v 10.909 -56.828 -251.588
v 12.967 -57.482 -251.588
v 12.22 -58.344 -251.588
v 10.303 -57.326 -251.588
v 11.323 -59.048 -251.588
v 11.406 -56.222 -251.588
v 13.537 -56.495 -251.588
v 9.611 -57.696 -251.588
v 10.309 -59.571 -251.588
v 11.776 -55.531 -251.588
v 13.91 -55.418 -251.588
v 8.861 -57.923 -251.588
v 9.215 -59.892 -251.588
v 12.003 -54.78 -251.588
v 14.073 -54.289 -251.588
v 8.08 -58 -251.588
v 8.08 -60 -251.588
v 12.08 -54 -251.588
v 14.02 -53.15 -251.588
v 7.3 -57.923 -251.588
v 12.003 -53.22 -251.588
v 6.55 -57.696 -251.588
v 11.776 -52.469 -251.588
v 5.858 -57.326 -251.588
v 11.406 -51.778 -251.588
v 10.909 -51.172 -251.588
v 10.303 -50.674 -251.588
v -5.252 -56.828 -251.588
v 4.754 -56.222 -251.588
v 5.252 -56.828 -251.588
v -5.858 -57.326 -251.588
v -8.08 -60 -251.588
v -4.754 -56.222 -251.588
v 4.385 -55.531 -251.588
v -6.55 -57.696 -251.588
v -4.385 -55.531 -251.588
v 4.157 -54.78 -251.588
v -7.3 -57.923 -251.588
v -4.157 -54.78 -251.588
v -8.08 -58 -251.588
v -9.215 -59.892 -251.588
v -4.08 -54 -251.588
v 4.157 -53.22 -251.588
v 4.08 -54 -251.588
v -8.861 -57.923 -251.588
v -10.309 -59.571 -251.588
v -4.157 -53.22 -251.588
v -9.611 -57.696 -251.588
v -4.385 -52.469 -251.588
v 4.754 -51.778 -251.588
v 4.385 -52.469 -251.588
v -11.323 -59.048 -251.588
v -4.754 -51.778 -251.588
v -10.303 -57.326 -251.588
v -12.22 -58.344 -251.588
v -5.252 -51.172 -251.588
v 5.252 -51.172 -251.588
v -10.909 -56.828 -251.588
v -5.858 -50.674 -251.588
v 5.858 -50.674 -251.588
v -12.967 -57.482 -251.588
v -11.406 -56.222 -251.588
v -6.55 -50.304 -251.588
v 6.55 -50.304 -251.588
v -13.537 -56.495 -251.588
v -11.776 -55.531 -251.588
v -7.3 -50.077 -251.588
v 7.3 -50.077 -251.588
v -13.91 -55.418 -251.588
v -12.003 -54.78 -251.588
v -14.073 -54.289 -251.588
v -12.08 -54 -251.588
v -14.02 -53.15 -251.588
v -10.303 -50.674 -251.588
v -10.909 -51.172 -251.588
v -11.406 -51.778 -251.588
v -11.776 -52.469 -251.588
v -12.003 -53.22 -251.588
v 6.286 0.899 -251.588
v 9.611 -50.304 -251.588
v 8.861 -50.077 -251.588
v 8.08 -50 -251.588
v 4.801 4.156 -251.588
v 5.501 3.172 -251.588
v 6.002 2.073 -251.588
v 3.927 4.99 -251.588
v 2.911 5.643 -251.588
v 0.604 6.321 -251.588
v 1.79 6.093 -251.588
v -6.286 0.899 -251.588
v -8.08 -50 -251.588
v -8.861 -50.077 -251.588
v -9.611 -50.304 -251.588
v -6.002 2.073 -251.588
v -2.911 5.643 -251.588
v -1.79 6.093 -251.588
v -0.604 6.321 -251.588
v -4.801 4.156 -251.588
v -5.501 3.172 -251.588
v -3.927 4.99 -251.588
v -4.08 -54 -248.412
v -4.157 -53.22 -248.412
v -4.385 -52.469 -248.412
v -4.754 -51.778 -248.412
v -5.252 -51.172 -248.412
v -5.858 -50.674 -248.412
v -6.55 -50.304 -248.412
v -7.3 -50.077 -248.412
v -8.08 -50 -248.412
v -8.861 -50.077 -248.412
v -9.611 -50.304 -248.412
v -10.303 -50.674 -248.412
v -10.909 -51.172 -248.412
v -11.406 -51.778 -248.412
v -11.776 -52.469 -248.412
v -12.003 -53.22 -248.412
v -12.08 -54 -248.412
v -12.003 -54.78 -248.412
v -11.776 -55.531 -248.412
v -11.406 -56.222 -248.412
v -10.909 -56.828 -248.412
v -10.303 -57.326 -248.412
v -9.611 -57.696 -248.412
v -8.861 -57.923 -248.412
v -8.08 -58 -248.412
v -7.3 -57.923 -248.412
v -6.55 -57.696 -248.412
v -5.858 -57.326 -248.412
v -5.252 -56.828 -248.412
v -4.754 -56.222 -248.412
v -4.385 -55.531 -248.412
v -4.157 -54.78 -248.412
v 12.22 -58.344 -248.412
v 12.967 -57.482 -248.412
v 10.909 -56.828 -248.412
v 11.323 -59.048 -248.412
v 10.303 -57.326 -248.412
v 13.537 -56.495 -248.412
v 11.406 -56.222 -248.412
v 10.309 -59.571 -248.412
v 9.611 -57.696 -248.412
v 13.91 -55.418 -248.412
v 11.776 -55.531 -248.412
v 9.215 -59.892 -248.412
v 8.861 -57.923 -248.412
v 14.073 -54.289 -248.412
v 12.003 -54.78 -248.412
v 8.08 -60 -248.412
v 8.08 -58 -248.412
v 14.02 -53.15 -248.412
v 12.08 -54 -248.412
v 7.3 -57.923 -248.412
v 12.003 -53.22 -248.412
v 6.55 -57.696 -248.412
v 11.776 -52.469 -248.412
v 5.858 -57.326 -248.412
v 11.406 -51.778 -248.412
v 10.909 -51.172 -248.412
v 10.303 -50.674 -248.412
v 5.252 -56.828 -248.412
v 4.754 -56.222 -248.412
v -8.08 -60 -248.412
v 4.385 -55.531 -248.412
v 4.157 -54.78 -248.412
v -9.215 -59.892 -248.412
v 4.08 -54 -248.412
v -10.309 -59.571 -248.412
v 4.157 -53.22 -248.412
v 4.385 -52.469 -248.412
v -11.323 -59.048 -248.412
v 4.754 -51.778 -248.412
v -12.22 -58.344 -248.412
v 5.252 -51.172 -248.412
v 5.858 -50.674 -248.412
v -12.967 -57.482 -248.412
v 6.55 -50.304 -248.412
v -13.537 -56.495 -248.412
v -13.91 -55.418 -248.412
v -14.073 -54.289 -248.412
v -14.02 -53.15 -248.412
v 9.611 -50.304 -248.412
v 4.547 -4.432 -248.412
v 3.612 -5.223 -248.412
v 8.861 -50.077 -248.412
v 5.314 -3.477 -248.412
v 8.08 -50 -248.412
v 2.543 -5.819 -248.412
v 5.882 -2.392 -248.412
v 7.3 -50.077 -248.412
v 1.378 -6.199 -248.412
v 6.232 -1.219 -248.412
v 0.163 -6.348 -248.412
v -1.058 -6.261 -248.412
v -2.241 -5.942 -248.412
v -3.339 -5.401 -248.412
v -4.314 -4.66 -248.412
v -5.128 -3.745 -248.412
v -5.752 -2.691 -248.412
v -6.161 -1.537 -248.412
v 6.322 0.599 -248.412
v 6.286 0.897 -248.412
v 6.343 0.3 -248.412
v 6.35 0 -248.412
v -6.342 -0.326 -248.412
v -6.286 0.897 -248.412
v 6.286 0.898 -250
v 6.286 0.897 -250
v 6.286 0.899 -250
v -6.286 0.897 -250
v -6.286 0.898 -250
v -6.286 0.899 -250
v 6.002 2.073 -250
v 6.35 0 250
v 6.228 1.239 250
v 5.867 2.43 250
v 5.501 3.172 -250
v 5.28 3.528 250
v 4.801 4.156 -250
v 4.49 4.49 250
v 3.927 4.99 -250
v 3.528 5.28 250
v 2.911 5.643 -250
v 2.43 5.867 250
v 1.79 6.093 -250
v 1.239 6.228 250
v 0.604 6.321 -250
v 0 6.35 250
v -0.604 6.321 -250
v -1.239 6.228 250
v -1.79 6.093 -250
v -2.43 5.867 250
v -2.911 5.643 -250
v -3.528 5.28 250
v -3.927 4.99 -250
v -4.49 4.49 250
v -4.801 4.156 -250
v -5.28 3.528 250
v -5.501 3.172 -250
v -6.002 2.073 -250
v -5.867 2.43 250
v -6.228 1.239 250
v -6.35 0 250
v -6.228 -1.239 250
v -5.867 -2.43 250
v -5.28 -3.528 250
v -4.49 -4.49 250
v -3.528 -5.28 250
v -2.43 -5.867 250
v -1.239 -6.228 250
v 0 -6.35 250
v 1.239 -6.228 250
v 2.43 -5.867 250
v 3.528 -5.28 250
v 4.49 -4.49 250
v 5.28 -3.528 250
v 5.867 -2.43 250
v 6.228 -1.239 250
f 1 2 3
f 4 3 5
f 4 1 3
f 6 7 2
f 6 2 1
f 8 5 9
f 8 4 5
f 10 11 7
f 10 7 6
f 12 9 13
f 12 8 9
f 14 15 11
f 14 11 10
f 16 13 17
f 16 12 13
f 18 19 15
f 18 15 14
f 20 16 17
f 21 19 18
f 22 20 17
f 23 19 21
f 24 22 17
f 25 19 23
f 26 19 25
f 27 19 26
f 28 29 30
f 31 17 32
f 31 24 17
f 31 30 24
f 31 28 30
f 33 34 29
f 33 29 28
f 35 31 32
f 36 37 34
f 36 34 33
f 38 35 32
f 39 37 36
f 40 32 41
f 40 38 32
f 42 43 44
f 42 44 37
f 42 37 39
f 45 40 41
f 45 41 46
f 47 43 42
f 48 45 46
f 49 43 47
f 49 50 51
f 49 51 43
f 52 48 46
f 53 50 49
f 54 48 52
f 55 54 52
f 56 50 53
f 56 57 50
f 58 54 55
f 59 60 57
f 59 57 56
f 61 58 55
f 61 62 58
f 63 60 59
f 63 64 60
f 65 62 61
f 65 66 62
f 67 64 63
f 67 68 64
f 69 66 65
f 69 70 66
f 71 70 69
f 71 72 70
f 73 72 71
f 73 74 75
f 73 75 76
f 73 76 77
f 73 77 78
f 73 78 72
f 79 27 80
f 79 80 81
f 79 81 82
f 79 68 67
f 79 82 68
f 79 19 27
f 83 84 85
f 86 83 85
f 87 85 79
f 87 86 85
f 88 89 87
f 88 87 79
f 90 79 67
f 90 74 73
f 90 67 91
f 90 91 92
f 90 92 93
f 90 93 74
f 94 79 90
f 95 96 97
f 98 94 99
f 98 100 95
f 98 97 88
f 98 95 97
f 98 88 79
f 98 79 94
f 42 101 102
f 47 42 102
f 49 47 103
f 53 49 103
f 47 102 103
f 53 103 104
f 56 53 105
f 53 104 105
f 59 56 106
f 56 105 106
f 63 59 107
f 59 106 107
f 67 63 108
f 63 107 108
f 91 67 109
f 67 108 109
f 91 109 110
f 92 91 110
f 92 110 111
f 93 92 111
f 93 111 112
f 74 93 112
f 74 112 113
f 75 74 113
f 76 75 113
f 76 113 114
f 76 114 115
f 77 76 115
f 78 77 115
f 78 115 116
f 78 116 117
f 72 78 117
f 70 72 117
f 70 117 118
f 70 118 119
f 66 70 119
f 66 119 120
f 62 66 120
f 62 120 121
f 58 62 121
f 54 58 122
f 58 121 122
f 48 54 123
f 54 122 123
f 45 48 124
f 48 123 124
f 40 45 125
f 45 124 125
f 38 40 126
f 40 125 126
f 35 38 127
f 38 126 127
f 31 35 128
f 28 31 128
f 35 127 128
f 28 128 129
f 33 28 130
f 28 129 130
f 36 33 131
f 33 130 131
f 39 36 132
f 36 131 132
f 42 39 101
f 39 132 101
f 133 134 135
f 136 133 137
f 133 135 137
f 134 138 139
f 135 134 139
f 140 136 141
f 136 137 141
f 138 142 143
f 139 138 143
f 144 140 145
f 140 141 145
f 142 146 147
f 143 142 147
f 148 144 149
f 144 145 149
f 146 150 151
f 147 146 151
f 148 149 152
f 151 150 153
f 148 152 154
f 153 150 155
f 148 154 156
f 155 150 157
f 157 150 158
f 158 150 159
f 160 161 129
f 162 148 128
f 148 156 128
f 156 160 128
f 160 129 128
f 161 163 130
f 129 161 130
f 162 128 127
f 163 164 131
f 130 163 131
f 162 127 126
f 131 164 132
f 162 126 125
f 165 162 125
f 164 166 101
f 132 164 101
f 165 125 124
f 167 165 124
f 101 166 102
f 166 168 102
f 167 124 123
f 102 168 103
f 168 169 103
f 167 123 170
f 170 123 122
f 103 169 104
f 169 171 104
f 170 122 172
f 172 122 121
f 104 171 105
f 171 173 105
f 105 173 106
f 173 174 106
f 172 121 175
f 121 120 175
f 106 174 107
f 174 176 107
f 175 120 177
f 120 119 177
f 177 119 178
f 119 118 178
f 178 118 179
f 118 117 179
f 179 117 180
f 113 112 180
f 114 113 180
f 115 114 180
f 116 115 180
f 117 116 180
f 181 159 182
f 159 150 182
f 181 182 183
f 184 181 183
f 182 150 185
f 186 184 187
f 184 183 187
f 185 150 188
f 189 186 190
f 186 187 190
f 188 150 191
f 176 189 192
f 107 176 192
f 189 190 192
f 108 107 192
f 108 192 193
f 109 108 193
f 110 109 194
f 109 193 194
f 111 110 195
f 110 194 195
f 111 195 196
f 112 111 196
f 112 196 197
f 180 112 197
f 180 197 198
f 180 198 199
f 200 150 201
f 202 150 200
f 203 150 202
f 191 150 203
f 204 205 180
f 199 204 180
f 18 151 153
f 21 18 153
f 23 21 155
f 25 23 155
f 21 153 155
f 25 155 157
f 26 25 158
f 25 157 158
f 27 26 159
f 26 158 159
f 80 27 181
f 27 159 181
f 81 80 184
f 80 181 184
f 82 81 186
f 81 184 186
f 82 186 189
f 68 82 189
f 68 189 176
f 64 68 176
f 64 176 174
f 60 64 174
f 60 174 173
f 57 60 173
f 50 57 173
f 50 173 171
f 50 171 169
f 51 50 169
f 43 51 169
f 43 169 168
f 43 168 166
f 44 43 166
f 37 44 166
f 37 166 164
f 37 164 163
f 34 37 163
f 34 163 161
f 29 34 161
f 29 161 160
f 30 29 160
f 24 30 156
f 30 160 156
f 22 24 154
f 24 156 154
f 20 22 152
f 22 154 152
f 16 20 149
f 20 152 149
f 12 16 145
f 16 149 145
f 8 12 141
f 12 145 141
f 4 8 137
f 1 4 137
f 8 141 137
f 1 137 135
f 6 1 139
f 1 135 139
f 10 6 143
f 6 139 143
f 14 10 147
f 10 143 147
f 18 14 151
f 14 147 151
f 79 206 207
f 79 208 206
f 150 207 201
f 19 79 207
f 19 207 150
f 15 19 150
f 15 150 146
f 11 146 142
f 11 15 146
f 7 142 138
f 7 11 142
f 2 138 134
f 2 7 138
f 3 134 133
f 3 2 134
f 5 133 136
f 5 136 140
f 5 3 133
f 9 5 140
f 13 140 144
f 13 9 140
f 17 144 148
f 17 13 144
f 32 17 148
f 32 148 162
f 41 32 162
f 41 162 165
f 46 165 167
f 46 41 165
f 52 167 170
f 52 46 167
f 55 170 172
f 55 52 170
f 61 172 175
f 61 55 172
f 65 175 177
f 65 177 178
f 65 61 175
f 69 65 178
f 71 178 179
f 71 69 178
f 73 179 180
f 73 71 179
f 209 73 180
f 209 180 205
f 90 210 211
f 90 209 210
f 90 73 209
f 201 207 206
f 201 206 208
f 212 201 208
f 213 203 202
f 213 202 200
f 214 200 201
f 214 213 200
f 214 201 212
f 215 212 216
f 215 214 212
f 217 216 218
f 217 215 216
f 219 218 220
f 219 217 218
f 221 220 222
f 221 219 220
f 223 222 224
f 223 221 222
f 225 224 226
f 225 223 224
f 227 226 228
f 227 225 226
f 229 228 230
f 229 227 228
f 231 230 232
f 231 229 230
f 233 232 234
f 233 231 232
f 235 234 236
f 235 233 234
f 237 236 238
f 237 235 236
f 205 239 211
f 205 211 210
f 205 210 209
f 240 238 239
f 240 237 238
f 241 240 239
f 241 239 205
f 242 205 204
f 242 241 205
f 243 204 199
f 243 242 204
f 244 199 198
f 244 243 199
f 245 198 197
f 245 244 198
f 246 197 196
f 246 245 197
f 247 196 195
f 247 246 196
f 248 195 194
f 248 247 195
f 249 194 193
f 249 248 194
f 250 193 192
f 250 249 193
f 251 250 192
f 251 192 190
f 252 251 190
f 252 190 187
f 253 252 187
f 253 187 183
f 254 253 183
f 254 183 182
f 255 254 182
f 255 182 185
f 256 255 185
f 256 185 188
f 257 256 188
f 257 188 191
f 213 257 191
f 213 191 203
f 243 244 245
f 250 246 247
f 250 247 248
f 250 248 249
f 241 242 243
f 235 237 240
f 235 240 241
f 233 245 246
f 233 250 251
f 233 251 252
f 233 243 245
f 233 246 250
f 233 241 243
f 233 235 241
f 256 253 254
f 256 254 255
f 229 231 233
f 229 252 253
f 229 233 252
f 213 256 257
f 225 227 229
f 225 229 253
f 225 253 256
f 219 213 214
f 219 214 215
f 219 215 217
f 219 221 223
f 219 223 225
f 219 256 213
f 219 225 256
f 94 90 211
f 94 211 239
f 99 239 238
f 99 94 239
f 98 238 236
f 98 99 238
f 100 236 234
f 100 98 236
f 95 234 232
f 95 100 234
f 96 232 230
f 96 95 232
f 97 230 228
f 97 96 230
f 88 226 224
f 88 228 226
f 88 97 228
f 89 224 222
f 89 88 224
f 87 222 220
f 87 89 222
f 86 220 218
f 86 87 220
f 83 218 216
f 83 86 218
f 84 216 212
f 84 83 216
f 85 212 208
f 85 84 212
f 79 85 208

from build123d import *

# Parameters (mm, degrees)
SKETCH1_R           = 6.35
BOSS_EXTRUDE1_DEPTH = 250
BOSS_EXTRUDE2_DEPTH = 1.5875
CUT_EXTRUDE1_REACH  = 5.175
SKETCH3_R           = 4


with BuildPart() as part:
    # Sketch1 → Boss-Extrude1 (new body, symmetric)
    with BuildSketch(Plane.XY):
        Circle(SKETCH1_R)
    extrude(amount=BOSS_EXTRUDE1_DEPTH, both=True)

    # Sketch2 → Boss-Extrude2 (add, symmetric)
    with BuildSketch(Plane(origin=(0, 0, -250), x_dir=(-1, 0, 0), z_dir=(0, 0, -1))):
        with BuildLine():
            Line((-6.285975, 0.899452), (-14.01986, -53.150124))
            ThreePointArc((-14.01986, -53.150124), (-12.613526, -57.930696), (-8.080356, -60))
            Line((-8.080356, -60), (8.080356, -60))
            ThreePointArc((8.080356, -60), (12.613526, -57.930696), (14.01986, -53.150124))
            Line((14.01986, -53.150124), (6.285975, 0.899452))
            ThreePointArc((6.285975, 0.899452), (0, 6.35), (-6.285975, 0.899452))
        make_face()
    extrude(amount=BOSS_EXTRUDE2_DEPTH, both=True)

    # Sketch3 → Cut-Extrude1 (cut, up to next)
    with BuildSketch(Plane.XY.offset(-248.4125), mode=Mode.PRIVATE) as cut_extrude1_sk1:
        with Locations((-8.080356, -54)):
            Circle(SKETCH3_R)
    cut_extrude1_tool1 = extrude(cut_extrude1_sk1.sketch, amount=-CUT_EXTRUDE1_REACH, mode=Mode.PRIVATE) & part.part
    add(cut_extrude1_tool1.solids().sort_by_distance((-8.080356, -54, -248.4125))[0], mode=Mode.SUBTRACT)
    # Sketch3 → Cut-Extrude1 (cut, up to next)
    with BuildSketch(Plane.XY.offset(-248.4125), mode=Mode.PRIVATE) as cut_extrude1_sk2:
        with Locations((8.080356, -54)):
            Circle(SKETCH3_R)
    cut_extrude1_tool2 = extrude(cut_extrude1_sk2.sketch, amount=-CUT_EXTRUDE1_REACH, mode=Mode.PRIVATE) & part.part
    add(cut_extrude1_tool2.solids().sort_by_distance((8.080356, -54, -248.4125))[0], mode=Mode.SUBTRACT)


solid = part.part
